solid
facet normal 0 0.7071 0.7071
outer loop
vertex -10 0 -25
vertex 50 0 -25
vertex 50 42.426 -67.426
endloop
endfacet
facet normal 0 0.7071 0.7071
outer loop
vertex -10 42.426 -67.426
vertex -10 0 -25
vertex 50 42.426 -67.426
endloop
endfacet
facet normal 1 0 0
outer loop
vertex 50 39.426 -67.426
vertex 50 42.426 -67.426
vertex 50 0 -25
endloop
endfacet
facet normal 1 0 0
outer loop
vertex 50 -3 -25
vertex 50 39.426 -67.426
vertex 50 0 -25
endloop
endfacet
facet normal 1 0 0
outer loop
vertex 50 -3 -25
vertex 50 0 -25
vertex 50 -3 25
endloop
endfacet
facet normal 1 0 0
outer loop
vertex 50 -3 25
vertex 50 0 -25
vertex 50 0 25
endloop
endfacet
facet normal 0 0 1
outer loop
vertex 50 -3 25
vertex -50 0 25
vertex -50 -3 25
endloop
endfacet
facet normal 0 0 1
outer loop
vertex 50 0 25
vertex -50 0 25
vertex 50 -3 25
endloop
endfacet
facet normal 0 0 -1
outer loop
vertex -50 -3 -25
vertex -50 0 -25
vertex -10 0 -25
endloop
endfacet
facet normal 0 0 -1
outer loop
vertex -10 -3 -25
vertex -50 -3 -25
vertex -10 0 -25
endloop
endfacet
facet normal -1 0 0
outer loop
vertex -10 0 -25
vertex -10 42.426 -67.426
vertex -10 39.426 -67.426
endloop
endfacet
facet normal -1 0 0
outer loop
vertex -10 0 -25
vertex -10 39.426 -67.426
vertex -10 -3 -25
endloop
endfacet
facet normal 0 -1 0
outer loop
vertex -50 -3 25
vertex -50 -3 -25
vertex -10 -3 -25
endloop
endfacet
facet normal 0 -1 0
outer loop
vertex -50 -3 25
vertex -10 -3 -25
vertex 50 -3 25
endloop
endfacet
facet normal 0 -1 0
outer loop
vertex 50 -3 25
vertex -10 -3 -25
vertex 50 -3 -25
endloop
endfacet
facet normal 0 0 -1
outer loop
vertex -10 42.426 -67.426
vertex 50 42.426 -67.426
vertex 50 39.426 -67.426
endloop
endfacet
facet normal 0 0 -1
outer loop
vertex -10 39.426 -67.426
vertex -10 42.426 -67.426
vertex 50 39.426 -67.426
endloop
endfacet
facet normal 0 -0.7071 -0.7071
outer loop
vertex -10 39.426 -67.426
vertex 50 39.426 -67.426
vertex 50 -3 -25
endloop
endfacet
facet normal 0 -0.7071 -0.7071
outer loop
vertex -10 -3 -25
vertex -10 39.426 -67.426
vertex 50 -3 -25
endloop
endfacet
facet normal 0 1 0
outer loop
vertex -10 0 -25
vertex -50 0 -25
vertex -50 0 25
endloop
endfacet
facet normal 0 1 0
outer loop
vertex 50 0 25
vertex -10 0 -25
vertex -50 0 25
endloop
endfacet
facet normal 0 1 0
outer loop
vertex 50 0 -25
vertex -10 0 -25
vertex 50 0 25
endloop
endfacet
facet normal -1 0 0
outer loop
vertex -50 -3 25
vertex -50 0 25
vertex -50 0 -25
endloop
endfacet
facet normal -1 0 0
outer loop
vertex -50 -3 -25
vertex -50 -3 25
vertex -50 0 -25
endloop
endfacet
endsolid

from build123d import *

# Parameters (mm, degrees)
SKETCH2_W           = 100
SKETCH2_H           = 50
BOSS_EXTRUDE1_DEPTH = 3
BOSS_EXTRUDE2_DEPTH = 60


with BuildPart() as part:
    # Sketch2 → Boss-Extrude1 (new body)
    with BuildSketch(Plane(origin=(0, 0, 0), x_dir=(1, 0, 0), z_dir=(0, 1, 0))):
        Rectangle(SKETCH2_W, SKETCH2_H)
    extrude(amount=-BOSS_EXTRUDE1_DEPTH)

    # Sketch3 → Boss-Extrude2 (add)
    with BuildSketch(Plane(origin=(50, 0, 0), x_dir=(0, 0, -1), z_dir=(1, 0, 0))):
        Polygon((25, 0), (67.426406871, 42.426406871), (67.426406871, 39.426406871), (25, -3), align=None)
    extrude(amount=-BOSS_EXTRUDE2_DEPTH)


solid = part.part
